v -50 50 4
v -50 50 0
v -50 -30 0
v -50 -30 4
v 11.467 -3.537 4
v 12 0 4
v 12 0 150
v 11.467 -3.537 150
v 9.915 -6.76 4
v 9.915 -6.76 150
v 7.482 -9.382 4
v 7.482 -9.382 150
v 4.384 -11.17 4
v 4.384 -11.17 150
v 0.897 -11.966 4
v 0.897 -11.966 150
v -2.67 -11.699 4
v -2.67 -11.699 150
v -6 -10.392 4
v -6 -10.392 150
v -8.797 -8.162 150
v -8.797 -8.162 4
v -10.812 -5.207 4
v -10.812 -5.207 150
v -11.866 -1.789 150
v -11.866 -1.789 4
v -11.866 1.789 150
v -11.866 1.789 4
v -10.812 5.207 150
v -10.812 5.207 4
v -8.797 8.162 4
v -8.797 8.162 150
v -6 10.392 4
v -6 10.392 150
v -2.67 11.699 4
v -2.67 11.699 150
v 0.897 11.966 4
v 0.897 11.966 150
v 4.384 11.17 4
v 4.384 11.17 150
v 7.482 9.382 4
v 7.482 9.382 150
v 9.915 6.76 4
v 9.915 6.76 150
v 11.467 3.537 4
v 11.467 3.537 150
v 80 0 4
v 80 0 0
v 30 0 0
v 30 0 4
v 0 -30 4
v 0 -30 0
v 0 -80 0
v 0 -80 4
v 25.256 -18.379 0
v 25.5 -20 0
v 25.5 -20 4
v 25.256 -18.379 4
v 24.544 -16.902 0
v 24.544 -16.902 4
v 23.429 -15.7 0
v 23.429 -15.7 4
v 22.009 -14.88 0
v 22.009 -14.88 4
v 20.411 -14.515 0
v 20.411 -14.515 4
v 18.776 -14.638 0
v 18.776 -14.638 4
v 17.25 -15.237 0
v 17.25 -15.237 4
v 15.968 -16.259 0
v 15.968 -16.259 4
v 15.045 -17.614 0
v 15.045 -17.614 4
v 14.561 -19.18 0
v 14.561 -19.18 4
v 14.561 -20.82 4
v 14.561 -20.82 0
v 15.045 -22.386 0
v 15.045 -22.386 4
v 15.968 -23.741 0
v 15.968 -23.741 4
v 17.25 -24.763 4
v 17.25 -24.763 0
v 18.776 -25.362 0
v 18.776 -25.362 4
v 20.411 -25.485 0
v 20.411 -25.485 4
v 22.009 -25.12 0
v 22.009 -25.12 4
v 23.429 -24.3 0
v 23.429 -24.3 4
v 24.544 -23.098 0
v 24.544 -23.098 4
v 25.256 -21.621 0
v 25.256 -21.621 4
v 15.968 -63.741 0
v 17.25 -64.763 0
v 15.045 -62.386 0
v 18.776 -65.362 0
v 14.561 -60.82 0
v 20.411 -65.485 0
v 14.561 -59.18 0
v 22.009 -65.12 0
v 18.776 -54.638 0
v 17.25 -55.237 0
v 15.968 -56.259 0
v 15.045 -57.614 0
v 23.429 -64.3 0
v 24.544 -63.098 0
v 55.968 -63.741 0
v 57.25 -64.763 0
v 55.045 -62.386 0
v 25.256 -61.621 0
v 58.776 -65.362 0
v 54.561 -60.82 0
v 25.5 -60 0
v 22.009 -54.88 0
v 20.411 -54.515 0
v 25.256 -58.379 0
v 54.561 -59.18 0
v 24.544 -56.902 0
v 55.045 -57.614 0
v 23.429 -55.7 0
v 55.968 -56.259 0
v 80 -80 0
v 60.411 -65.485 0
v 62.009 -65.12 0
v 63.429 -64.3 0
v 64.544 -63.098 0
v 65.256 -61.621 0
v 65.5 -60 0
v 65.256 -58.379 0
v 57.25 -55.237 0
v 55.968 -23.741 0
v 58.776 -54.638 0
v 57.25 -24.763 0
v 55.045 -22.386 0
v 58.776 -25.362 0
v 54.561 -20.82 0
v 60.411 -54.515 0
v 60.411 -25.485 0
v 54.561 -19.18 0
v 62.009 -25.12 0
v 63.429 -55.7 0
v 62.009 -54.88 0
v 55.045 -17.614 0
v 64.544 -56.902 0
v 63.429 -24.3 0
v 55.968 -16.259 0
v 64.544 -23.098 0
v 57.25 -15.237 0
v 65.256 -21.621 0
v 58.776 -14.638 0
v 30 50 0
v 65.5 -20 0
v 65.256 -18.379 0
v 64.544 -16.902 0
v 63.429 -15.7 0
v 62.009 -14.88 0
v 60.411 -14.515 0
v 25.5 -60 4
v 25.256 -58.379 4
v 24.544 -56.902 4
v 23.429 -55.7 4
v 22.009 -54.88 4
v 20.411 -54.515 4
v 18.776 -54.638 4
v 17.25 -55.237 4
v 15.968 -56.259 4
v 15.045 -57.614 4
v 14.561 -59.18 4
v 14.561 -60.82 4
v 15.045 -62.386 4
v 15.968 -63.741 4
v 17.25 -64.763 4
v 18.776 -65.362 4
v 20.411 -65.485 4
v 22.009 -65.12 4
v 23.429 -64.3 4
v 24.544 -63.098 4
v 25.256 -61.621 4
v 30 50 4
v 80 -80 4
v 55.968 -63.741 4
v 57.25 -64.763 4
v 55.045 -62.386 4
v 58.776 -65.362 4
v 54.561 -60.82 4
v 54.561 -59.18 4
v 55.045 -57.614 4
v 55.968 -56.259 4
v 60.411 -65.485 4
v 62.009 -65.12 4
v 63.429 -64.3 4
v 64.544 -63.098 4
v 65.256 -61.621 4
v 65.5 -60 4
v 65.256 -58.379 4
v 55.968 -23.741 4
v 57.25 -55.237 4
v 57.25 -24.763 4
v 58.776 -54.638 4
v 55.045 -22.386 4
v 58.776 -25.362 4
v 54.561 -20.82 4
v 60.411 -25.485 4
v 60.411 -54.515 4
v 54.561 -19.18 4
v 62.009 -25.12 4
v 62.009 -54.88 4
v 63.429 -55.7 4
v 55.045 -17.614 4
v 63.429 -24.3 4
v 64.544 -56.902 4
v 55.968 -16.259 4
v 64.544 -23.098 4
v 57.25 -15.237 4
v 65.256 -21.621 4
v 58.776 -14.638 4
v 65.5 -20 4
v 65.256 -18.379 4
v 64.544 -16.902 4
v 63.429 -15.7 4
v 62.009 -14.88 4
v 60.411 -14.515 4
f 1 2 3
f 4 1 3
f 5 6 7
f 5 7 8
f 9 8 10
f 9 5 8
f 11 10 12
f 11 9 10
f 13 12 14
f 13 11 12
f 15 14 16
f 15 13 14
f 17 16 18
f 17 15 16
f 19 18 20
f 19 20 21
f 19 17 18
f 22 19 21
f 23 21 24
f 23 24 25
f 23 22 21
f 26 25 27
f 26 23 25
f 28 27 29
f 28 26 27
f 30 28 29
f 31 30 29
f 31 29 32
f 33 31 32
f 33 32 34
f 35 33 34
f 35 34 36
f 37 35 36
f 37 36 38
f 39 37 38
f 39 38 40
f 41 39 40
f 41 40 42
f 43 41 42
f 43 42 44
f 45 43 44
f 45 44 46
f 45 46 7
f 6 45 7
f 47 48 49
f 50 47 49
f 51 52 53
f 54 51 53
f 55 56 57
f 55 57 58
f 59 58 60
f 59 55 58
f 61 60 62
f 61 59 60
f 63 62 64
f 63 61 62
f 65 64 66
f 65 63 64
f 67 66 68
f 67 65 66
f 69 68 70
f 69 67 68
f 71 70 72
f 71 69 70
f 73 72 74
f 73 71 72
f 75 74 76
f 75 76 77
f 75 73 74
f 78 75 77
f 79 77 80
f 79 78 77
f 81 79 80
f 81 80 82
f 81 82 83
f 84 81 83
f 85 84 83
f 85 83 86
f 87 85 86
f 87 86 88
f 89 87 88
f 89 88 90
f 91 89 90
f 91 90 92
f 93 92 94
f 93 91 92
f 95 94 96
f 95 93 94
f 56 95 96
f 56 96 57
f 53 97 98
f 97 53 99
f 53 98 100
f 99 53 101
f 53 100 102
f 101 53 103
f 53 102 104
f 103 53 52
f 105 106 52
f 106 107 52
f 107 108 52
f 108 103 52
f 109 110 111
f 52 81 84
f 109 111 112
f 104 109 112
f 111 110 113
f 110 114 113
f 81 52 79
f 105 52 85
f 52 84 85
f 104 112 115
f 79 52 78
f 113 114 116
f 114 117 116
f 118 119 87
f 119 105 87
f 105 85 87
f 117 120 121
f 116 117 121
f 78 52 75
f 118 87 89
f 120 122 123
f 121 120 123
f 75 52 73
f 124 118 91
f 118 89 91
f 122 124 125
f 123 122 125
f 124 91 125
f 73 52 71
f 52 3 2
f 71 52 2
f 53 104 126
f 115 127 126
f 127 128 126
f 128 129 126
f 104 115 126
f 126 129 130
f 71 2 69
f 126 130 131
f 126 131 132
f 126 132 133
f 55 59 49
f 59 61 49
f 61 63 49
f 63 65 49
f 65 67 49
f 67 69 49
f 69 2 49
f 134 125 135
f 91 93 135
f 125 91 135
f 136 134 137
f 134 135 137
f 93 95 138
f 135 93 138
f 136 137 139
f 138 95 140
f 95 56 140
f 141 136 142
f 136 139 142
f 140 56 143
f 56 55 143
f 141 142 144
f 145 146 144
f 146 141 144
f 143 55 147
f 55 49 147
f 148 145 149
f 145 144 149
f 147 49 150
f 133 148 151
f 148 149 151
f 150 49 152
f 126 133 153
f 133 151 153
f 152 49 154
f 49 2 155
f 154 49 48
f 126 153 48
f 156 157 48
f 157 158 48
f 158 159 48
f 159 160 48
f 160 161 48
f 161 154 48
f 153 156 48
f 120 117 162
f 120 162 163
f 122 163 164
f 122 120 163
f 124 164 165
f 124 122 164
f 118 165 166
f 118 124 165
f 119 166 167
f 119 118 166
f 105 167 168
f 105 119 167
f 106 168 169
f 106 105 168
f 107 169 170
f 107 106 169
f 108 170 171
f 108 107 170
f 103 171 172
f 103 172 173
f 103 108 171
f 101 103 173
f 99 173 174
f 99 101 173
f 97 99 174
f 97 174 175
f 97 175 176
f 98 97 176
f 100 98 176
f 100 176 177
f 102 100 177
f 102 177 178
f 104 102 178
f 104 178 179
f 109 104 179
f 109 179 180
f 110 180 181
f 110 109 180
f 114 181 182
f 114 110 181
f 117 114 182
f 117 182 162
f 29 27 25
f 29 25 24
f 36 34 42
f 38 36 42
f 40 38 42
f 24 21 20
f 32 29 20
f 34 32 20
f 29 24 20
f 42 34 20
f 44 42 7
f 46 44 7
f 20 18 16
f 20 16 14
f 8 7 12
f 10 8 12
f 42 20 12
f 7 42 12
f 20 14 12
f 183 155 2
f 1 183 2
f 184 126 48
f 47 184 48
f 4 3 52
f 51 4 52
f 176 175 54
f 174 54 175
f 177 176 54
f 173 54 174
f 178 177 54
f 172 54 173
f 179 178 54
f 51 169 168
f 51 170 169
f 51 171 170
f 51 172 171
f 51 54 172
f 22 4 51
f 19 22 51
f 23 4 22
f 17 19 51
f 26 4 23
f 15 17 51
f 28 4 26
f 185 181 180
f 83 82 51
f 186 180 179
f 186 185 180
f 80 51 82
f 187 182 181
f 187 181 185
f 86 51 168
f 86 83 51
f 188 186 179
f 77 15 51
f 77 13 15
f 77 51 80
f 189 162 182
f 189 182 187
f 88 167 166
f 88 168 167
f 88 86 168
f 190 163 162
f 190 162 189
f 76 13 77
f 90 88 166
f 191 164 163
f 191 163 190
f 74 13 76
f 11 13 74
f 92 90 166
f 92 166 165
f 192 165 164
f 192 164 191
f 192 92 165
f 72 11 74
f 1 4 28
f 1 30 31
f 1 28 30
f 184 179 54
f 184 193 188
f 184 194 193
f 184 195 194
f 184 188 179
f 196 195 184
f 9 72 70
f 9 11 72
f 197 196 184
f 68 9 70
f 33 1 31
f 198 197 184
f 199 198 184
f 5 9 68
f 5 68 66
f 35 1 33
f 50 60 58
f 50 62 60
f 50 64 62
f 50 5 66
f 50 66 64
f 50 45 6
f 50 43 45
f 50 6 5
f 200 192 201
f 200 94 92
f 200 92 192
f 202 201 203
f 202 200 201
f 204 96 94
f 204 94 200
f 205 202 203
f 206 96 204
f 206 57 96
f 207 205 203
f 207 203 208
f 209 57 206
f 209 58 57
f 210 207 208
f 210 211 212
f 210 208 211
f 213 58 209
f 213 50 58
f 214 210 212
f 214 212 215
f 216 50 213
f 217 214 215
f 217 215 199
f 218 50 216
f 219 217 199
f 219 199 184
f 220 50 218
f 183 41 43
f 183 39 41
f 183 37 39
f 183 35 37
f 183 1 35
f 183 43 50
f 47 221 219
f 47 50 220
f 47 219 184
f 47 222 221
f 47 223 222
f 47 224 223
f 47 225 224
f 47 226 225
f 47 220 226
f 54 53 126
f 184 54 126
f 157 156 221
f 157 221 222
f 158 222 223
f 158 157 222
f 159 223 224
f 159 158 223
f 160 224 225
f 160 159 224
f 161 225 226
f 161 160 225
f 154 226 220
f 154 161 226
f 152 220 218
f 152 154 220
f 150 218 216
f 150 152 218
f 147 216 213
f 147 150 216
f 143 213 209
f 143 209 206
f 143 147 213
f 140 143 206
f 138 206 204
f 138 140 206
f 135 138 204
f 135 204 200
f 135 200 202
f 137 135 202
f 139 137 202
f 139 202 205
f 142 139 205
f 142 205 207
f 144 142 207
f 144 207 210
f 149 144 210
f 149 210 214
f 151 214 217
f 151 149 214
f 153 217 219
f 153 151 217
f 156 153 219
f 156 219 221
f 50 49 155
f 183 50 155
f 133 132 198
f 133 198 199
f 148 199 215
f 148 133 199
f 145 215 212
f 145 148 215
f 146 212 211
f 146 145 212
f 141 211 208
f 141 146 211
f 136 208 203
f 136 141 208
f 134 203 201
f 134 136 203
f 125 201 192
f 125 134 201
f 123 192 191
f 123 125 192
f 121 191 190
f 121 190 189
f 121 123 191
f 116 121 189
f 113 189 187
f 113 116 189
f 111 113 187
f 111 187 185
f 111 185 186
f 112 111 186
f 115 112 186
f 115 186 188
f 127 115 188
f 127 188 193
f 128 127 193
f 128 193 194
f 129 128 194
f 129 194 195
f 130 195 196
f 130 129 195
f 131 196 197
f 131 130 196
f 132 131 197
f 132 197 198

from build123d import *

# Parameters (mm, degrees)
F0_R     = 5.5
F0_R_2   = 12
F1_DEPTH = 4
F2_R     = 12
F3_DEPTH = 150


with BuildPart() as f1:
    # F0 (on Top) → F1 (new body)
    with BuildSketch(Plane.XY):
        Polygon((30, 50), (-50, 50), (-50, -30), (0, -30), (0, -80), (80, -80), (80, 0), (30, 0), align=None)
        with Locations((20, -60)):
            Circle(F0_R, mode=Mode.SUBTRACT)
        with Locations((60, -60)):
            Circle(F0_R, mode=Mode.SUBTRACT)
        with Locations((20, -20)):
            Circle(F0_R, mode=Mode.SUBTRACT)
        with Locations((60, -20)):
            Circle(F0_R, mode=Mode.SUBTRACT)
        Circle(F0_R_2, mode=Mode.SUBTRACT)
    extrude(amount=F1_DEPTH)

    # F2 (on face) → F3 (join)
    with BuildSketch(Plane(origin=(0, 0, 0), x_dir=(1, 0, 0), z_dir=(0, 0, -1))):
        Circle(F2_R)
    extrude(amount=-F3_DEPTH)


solid = f1.part
